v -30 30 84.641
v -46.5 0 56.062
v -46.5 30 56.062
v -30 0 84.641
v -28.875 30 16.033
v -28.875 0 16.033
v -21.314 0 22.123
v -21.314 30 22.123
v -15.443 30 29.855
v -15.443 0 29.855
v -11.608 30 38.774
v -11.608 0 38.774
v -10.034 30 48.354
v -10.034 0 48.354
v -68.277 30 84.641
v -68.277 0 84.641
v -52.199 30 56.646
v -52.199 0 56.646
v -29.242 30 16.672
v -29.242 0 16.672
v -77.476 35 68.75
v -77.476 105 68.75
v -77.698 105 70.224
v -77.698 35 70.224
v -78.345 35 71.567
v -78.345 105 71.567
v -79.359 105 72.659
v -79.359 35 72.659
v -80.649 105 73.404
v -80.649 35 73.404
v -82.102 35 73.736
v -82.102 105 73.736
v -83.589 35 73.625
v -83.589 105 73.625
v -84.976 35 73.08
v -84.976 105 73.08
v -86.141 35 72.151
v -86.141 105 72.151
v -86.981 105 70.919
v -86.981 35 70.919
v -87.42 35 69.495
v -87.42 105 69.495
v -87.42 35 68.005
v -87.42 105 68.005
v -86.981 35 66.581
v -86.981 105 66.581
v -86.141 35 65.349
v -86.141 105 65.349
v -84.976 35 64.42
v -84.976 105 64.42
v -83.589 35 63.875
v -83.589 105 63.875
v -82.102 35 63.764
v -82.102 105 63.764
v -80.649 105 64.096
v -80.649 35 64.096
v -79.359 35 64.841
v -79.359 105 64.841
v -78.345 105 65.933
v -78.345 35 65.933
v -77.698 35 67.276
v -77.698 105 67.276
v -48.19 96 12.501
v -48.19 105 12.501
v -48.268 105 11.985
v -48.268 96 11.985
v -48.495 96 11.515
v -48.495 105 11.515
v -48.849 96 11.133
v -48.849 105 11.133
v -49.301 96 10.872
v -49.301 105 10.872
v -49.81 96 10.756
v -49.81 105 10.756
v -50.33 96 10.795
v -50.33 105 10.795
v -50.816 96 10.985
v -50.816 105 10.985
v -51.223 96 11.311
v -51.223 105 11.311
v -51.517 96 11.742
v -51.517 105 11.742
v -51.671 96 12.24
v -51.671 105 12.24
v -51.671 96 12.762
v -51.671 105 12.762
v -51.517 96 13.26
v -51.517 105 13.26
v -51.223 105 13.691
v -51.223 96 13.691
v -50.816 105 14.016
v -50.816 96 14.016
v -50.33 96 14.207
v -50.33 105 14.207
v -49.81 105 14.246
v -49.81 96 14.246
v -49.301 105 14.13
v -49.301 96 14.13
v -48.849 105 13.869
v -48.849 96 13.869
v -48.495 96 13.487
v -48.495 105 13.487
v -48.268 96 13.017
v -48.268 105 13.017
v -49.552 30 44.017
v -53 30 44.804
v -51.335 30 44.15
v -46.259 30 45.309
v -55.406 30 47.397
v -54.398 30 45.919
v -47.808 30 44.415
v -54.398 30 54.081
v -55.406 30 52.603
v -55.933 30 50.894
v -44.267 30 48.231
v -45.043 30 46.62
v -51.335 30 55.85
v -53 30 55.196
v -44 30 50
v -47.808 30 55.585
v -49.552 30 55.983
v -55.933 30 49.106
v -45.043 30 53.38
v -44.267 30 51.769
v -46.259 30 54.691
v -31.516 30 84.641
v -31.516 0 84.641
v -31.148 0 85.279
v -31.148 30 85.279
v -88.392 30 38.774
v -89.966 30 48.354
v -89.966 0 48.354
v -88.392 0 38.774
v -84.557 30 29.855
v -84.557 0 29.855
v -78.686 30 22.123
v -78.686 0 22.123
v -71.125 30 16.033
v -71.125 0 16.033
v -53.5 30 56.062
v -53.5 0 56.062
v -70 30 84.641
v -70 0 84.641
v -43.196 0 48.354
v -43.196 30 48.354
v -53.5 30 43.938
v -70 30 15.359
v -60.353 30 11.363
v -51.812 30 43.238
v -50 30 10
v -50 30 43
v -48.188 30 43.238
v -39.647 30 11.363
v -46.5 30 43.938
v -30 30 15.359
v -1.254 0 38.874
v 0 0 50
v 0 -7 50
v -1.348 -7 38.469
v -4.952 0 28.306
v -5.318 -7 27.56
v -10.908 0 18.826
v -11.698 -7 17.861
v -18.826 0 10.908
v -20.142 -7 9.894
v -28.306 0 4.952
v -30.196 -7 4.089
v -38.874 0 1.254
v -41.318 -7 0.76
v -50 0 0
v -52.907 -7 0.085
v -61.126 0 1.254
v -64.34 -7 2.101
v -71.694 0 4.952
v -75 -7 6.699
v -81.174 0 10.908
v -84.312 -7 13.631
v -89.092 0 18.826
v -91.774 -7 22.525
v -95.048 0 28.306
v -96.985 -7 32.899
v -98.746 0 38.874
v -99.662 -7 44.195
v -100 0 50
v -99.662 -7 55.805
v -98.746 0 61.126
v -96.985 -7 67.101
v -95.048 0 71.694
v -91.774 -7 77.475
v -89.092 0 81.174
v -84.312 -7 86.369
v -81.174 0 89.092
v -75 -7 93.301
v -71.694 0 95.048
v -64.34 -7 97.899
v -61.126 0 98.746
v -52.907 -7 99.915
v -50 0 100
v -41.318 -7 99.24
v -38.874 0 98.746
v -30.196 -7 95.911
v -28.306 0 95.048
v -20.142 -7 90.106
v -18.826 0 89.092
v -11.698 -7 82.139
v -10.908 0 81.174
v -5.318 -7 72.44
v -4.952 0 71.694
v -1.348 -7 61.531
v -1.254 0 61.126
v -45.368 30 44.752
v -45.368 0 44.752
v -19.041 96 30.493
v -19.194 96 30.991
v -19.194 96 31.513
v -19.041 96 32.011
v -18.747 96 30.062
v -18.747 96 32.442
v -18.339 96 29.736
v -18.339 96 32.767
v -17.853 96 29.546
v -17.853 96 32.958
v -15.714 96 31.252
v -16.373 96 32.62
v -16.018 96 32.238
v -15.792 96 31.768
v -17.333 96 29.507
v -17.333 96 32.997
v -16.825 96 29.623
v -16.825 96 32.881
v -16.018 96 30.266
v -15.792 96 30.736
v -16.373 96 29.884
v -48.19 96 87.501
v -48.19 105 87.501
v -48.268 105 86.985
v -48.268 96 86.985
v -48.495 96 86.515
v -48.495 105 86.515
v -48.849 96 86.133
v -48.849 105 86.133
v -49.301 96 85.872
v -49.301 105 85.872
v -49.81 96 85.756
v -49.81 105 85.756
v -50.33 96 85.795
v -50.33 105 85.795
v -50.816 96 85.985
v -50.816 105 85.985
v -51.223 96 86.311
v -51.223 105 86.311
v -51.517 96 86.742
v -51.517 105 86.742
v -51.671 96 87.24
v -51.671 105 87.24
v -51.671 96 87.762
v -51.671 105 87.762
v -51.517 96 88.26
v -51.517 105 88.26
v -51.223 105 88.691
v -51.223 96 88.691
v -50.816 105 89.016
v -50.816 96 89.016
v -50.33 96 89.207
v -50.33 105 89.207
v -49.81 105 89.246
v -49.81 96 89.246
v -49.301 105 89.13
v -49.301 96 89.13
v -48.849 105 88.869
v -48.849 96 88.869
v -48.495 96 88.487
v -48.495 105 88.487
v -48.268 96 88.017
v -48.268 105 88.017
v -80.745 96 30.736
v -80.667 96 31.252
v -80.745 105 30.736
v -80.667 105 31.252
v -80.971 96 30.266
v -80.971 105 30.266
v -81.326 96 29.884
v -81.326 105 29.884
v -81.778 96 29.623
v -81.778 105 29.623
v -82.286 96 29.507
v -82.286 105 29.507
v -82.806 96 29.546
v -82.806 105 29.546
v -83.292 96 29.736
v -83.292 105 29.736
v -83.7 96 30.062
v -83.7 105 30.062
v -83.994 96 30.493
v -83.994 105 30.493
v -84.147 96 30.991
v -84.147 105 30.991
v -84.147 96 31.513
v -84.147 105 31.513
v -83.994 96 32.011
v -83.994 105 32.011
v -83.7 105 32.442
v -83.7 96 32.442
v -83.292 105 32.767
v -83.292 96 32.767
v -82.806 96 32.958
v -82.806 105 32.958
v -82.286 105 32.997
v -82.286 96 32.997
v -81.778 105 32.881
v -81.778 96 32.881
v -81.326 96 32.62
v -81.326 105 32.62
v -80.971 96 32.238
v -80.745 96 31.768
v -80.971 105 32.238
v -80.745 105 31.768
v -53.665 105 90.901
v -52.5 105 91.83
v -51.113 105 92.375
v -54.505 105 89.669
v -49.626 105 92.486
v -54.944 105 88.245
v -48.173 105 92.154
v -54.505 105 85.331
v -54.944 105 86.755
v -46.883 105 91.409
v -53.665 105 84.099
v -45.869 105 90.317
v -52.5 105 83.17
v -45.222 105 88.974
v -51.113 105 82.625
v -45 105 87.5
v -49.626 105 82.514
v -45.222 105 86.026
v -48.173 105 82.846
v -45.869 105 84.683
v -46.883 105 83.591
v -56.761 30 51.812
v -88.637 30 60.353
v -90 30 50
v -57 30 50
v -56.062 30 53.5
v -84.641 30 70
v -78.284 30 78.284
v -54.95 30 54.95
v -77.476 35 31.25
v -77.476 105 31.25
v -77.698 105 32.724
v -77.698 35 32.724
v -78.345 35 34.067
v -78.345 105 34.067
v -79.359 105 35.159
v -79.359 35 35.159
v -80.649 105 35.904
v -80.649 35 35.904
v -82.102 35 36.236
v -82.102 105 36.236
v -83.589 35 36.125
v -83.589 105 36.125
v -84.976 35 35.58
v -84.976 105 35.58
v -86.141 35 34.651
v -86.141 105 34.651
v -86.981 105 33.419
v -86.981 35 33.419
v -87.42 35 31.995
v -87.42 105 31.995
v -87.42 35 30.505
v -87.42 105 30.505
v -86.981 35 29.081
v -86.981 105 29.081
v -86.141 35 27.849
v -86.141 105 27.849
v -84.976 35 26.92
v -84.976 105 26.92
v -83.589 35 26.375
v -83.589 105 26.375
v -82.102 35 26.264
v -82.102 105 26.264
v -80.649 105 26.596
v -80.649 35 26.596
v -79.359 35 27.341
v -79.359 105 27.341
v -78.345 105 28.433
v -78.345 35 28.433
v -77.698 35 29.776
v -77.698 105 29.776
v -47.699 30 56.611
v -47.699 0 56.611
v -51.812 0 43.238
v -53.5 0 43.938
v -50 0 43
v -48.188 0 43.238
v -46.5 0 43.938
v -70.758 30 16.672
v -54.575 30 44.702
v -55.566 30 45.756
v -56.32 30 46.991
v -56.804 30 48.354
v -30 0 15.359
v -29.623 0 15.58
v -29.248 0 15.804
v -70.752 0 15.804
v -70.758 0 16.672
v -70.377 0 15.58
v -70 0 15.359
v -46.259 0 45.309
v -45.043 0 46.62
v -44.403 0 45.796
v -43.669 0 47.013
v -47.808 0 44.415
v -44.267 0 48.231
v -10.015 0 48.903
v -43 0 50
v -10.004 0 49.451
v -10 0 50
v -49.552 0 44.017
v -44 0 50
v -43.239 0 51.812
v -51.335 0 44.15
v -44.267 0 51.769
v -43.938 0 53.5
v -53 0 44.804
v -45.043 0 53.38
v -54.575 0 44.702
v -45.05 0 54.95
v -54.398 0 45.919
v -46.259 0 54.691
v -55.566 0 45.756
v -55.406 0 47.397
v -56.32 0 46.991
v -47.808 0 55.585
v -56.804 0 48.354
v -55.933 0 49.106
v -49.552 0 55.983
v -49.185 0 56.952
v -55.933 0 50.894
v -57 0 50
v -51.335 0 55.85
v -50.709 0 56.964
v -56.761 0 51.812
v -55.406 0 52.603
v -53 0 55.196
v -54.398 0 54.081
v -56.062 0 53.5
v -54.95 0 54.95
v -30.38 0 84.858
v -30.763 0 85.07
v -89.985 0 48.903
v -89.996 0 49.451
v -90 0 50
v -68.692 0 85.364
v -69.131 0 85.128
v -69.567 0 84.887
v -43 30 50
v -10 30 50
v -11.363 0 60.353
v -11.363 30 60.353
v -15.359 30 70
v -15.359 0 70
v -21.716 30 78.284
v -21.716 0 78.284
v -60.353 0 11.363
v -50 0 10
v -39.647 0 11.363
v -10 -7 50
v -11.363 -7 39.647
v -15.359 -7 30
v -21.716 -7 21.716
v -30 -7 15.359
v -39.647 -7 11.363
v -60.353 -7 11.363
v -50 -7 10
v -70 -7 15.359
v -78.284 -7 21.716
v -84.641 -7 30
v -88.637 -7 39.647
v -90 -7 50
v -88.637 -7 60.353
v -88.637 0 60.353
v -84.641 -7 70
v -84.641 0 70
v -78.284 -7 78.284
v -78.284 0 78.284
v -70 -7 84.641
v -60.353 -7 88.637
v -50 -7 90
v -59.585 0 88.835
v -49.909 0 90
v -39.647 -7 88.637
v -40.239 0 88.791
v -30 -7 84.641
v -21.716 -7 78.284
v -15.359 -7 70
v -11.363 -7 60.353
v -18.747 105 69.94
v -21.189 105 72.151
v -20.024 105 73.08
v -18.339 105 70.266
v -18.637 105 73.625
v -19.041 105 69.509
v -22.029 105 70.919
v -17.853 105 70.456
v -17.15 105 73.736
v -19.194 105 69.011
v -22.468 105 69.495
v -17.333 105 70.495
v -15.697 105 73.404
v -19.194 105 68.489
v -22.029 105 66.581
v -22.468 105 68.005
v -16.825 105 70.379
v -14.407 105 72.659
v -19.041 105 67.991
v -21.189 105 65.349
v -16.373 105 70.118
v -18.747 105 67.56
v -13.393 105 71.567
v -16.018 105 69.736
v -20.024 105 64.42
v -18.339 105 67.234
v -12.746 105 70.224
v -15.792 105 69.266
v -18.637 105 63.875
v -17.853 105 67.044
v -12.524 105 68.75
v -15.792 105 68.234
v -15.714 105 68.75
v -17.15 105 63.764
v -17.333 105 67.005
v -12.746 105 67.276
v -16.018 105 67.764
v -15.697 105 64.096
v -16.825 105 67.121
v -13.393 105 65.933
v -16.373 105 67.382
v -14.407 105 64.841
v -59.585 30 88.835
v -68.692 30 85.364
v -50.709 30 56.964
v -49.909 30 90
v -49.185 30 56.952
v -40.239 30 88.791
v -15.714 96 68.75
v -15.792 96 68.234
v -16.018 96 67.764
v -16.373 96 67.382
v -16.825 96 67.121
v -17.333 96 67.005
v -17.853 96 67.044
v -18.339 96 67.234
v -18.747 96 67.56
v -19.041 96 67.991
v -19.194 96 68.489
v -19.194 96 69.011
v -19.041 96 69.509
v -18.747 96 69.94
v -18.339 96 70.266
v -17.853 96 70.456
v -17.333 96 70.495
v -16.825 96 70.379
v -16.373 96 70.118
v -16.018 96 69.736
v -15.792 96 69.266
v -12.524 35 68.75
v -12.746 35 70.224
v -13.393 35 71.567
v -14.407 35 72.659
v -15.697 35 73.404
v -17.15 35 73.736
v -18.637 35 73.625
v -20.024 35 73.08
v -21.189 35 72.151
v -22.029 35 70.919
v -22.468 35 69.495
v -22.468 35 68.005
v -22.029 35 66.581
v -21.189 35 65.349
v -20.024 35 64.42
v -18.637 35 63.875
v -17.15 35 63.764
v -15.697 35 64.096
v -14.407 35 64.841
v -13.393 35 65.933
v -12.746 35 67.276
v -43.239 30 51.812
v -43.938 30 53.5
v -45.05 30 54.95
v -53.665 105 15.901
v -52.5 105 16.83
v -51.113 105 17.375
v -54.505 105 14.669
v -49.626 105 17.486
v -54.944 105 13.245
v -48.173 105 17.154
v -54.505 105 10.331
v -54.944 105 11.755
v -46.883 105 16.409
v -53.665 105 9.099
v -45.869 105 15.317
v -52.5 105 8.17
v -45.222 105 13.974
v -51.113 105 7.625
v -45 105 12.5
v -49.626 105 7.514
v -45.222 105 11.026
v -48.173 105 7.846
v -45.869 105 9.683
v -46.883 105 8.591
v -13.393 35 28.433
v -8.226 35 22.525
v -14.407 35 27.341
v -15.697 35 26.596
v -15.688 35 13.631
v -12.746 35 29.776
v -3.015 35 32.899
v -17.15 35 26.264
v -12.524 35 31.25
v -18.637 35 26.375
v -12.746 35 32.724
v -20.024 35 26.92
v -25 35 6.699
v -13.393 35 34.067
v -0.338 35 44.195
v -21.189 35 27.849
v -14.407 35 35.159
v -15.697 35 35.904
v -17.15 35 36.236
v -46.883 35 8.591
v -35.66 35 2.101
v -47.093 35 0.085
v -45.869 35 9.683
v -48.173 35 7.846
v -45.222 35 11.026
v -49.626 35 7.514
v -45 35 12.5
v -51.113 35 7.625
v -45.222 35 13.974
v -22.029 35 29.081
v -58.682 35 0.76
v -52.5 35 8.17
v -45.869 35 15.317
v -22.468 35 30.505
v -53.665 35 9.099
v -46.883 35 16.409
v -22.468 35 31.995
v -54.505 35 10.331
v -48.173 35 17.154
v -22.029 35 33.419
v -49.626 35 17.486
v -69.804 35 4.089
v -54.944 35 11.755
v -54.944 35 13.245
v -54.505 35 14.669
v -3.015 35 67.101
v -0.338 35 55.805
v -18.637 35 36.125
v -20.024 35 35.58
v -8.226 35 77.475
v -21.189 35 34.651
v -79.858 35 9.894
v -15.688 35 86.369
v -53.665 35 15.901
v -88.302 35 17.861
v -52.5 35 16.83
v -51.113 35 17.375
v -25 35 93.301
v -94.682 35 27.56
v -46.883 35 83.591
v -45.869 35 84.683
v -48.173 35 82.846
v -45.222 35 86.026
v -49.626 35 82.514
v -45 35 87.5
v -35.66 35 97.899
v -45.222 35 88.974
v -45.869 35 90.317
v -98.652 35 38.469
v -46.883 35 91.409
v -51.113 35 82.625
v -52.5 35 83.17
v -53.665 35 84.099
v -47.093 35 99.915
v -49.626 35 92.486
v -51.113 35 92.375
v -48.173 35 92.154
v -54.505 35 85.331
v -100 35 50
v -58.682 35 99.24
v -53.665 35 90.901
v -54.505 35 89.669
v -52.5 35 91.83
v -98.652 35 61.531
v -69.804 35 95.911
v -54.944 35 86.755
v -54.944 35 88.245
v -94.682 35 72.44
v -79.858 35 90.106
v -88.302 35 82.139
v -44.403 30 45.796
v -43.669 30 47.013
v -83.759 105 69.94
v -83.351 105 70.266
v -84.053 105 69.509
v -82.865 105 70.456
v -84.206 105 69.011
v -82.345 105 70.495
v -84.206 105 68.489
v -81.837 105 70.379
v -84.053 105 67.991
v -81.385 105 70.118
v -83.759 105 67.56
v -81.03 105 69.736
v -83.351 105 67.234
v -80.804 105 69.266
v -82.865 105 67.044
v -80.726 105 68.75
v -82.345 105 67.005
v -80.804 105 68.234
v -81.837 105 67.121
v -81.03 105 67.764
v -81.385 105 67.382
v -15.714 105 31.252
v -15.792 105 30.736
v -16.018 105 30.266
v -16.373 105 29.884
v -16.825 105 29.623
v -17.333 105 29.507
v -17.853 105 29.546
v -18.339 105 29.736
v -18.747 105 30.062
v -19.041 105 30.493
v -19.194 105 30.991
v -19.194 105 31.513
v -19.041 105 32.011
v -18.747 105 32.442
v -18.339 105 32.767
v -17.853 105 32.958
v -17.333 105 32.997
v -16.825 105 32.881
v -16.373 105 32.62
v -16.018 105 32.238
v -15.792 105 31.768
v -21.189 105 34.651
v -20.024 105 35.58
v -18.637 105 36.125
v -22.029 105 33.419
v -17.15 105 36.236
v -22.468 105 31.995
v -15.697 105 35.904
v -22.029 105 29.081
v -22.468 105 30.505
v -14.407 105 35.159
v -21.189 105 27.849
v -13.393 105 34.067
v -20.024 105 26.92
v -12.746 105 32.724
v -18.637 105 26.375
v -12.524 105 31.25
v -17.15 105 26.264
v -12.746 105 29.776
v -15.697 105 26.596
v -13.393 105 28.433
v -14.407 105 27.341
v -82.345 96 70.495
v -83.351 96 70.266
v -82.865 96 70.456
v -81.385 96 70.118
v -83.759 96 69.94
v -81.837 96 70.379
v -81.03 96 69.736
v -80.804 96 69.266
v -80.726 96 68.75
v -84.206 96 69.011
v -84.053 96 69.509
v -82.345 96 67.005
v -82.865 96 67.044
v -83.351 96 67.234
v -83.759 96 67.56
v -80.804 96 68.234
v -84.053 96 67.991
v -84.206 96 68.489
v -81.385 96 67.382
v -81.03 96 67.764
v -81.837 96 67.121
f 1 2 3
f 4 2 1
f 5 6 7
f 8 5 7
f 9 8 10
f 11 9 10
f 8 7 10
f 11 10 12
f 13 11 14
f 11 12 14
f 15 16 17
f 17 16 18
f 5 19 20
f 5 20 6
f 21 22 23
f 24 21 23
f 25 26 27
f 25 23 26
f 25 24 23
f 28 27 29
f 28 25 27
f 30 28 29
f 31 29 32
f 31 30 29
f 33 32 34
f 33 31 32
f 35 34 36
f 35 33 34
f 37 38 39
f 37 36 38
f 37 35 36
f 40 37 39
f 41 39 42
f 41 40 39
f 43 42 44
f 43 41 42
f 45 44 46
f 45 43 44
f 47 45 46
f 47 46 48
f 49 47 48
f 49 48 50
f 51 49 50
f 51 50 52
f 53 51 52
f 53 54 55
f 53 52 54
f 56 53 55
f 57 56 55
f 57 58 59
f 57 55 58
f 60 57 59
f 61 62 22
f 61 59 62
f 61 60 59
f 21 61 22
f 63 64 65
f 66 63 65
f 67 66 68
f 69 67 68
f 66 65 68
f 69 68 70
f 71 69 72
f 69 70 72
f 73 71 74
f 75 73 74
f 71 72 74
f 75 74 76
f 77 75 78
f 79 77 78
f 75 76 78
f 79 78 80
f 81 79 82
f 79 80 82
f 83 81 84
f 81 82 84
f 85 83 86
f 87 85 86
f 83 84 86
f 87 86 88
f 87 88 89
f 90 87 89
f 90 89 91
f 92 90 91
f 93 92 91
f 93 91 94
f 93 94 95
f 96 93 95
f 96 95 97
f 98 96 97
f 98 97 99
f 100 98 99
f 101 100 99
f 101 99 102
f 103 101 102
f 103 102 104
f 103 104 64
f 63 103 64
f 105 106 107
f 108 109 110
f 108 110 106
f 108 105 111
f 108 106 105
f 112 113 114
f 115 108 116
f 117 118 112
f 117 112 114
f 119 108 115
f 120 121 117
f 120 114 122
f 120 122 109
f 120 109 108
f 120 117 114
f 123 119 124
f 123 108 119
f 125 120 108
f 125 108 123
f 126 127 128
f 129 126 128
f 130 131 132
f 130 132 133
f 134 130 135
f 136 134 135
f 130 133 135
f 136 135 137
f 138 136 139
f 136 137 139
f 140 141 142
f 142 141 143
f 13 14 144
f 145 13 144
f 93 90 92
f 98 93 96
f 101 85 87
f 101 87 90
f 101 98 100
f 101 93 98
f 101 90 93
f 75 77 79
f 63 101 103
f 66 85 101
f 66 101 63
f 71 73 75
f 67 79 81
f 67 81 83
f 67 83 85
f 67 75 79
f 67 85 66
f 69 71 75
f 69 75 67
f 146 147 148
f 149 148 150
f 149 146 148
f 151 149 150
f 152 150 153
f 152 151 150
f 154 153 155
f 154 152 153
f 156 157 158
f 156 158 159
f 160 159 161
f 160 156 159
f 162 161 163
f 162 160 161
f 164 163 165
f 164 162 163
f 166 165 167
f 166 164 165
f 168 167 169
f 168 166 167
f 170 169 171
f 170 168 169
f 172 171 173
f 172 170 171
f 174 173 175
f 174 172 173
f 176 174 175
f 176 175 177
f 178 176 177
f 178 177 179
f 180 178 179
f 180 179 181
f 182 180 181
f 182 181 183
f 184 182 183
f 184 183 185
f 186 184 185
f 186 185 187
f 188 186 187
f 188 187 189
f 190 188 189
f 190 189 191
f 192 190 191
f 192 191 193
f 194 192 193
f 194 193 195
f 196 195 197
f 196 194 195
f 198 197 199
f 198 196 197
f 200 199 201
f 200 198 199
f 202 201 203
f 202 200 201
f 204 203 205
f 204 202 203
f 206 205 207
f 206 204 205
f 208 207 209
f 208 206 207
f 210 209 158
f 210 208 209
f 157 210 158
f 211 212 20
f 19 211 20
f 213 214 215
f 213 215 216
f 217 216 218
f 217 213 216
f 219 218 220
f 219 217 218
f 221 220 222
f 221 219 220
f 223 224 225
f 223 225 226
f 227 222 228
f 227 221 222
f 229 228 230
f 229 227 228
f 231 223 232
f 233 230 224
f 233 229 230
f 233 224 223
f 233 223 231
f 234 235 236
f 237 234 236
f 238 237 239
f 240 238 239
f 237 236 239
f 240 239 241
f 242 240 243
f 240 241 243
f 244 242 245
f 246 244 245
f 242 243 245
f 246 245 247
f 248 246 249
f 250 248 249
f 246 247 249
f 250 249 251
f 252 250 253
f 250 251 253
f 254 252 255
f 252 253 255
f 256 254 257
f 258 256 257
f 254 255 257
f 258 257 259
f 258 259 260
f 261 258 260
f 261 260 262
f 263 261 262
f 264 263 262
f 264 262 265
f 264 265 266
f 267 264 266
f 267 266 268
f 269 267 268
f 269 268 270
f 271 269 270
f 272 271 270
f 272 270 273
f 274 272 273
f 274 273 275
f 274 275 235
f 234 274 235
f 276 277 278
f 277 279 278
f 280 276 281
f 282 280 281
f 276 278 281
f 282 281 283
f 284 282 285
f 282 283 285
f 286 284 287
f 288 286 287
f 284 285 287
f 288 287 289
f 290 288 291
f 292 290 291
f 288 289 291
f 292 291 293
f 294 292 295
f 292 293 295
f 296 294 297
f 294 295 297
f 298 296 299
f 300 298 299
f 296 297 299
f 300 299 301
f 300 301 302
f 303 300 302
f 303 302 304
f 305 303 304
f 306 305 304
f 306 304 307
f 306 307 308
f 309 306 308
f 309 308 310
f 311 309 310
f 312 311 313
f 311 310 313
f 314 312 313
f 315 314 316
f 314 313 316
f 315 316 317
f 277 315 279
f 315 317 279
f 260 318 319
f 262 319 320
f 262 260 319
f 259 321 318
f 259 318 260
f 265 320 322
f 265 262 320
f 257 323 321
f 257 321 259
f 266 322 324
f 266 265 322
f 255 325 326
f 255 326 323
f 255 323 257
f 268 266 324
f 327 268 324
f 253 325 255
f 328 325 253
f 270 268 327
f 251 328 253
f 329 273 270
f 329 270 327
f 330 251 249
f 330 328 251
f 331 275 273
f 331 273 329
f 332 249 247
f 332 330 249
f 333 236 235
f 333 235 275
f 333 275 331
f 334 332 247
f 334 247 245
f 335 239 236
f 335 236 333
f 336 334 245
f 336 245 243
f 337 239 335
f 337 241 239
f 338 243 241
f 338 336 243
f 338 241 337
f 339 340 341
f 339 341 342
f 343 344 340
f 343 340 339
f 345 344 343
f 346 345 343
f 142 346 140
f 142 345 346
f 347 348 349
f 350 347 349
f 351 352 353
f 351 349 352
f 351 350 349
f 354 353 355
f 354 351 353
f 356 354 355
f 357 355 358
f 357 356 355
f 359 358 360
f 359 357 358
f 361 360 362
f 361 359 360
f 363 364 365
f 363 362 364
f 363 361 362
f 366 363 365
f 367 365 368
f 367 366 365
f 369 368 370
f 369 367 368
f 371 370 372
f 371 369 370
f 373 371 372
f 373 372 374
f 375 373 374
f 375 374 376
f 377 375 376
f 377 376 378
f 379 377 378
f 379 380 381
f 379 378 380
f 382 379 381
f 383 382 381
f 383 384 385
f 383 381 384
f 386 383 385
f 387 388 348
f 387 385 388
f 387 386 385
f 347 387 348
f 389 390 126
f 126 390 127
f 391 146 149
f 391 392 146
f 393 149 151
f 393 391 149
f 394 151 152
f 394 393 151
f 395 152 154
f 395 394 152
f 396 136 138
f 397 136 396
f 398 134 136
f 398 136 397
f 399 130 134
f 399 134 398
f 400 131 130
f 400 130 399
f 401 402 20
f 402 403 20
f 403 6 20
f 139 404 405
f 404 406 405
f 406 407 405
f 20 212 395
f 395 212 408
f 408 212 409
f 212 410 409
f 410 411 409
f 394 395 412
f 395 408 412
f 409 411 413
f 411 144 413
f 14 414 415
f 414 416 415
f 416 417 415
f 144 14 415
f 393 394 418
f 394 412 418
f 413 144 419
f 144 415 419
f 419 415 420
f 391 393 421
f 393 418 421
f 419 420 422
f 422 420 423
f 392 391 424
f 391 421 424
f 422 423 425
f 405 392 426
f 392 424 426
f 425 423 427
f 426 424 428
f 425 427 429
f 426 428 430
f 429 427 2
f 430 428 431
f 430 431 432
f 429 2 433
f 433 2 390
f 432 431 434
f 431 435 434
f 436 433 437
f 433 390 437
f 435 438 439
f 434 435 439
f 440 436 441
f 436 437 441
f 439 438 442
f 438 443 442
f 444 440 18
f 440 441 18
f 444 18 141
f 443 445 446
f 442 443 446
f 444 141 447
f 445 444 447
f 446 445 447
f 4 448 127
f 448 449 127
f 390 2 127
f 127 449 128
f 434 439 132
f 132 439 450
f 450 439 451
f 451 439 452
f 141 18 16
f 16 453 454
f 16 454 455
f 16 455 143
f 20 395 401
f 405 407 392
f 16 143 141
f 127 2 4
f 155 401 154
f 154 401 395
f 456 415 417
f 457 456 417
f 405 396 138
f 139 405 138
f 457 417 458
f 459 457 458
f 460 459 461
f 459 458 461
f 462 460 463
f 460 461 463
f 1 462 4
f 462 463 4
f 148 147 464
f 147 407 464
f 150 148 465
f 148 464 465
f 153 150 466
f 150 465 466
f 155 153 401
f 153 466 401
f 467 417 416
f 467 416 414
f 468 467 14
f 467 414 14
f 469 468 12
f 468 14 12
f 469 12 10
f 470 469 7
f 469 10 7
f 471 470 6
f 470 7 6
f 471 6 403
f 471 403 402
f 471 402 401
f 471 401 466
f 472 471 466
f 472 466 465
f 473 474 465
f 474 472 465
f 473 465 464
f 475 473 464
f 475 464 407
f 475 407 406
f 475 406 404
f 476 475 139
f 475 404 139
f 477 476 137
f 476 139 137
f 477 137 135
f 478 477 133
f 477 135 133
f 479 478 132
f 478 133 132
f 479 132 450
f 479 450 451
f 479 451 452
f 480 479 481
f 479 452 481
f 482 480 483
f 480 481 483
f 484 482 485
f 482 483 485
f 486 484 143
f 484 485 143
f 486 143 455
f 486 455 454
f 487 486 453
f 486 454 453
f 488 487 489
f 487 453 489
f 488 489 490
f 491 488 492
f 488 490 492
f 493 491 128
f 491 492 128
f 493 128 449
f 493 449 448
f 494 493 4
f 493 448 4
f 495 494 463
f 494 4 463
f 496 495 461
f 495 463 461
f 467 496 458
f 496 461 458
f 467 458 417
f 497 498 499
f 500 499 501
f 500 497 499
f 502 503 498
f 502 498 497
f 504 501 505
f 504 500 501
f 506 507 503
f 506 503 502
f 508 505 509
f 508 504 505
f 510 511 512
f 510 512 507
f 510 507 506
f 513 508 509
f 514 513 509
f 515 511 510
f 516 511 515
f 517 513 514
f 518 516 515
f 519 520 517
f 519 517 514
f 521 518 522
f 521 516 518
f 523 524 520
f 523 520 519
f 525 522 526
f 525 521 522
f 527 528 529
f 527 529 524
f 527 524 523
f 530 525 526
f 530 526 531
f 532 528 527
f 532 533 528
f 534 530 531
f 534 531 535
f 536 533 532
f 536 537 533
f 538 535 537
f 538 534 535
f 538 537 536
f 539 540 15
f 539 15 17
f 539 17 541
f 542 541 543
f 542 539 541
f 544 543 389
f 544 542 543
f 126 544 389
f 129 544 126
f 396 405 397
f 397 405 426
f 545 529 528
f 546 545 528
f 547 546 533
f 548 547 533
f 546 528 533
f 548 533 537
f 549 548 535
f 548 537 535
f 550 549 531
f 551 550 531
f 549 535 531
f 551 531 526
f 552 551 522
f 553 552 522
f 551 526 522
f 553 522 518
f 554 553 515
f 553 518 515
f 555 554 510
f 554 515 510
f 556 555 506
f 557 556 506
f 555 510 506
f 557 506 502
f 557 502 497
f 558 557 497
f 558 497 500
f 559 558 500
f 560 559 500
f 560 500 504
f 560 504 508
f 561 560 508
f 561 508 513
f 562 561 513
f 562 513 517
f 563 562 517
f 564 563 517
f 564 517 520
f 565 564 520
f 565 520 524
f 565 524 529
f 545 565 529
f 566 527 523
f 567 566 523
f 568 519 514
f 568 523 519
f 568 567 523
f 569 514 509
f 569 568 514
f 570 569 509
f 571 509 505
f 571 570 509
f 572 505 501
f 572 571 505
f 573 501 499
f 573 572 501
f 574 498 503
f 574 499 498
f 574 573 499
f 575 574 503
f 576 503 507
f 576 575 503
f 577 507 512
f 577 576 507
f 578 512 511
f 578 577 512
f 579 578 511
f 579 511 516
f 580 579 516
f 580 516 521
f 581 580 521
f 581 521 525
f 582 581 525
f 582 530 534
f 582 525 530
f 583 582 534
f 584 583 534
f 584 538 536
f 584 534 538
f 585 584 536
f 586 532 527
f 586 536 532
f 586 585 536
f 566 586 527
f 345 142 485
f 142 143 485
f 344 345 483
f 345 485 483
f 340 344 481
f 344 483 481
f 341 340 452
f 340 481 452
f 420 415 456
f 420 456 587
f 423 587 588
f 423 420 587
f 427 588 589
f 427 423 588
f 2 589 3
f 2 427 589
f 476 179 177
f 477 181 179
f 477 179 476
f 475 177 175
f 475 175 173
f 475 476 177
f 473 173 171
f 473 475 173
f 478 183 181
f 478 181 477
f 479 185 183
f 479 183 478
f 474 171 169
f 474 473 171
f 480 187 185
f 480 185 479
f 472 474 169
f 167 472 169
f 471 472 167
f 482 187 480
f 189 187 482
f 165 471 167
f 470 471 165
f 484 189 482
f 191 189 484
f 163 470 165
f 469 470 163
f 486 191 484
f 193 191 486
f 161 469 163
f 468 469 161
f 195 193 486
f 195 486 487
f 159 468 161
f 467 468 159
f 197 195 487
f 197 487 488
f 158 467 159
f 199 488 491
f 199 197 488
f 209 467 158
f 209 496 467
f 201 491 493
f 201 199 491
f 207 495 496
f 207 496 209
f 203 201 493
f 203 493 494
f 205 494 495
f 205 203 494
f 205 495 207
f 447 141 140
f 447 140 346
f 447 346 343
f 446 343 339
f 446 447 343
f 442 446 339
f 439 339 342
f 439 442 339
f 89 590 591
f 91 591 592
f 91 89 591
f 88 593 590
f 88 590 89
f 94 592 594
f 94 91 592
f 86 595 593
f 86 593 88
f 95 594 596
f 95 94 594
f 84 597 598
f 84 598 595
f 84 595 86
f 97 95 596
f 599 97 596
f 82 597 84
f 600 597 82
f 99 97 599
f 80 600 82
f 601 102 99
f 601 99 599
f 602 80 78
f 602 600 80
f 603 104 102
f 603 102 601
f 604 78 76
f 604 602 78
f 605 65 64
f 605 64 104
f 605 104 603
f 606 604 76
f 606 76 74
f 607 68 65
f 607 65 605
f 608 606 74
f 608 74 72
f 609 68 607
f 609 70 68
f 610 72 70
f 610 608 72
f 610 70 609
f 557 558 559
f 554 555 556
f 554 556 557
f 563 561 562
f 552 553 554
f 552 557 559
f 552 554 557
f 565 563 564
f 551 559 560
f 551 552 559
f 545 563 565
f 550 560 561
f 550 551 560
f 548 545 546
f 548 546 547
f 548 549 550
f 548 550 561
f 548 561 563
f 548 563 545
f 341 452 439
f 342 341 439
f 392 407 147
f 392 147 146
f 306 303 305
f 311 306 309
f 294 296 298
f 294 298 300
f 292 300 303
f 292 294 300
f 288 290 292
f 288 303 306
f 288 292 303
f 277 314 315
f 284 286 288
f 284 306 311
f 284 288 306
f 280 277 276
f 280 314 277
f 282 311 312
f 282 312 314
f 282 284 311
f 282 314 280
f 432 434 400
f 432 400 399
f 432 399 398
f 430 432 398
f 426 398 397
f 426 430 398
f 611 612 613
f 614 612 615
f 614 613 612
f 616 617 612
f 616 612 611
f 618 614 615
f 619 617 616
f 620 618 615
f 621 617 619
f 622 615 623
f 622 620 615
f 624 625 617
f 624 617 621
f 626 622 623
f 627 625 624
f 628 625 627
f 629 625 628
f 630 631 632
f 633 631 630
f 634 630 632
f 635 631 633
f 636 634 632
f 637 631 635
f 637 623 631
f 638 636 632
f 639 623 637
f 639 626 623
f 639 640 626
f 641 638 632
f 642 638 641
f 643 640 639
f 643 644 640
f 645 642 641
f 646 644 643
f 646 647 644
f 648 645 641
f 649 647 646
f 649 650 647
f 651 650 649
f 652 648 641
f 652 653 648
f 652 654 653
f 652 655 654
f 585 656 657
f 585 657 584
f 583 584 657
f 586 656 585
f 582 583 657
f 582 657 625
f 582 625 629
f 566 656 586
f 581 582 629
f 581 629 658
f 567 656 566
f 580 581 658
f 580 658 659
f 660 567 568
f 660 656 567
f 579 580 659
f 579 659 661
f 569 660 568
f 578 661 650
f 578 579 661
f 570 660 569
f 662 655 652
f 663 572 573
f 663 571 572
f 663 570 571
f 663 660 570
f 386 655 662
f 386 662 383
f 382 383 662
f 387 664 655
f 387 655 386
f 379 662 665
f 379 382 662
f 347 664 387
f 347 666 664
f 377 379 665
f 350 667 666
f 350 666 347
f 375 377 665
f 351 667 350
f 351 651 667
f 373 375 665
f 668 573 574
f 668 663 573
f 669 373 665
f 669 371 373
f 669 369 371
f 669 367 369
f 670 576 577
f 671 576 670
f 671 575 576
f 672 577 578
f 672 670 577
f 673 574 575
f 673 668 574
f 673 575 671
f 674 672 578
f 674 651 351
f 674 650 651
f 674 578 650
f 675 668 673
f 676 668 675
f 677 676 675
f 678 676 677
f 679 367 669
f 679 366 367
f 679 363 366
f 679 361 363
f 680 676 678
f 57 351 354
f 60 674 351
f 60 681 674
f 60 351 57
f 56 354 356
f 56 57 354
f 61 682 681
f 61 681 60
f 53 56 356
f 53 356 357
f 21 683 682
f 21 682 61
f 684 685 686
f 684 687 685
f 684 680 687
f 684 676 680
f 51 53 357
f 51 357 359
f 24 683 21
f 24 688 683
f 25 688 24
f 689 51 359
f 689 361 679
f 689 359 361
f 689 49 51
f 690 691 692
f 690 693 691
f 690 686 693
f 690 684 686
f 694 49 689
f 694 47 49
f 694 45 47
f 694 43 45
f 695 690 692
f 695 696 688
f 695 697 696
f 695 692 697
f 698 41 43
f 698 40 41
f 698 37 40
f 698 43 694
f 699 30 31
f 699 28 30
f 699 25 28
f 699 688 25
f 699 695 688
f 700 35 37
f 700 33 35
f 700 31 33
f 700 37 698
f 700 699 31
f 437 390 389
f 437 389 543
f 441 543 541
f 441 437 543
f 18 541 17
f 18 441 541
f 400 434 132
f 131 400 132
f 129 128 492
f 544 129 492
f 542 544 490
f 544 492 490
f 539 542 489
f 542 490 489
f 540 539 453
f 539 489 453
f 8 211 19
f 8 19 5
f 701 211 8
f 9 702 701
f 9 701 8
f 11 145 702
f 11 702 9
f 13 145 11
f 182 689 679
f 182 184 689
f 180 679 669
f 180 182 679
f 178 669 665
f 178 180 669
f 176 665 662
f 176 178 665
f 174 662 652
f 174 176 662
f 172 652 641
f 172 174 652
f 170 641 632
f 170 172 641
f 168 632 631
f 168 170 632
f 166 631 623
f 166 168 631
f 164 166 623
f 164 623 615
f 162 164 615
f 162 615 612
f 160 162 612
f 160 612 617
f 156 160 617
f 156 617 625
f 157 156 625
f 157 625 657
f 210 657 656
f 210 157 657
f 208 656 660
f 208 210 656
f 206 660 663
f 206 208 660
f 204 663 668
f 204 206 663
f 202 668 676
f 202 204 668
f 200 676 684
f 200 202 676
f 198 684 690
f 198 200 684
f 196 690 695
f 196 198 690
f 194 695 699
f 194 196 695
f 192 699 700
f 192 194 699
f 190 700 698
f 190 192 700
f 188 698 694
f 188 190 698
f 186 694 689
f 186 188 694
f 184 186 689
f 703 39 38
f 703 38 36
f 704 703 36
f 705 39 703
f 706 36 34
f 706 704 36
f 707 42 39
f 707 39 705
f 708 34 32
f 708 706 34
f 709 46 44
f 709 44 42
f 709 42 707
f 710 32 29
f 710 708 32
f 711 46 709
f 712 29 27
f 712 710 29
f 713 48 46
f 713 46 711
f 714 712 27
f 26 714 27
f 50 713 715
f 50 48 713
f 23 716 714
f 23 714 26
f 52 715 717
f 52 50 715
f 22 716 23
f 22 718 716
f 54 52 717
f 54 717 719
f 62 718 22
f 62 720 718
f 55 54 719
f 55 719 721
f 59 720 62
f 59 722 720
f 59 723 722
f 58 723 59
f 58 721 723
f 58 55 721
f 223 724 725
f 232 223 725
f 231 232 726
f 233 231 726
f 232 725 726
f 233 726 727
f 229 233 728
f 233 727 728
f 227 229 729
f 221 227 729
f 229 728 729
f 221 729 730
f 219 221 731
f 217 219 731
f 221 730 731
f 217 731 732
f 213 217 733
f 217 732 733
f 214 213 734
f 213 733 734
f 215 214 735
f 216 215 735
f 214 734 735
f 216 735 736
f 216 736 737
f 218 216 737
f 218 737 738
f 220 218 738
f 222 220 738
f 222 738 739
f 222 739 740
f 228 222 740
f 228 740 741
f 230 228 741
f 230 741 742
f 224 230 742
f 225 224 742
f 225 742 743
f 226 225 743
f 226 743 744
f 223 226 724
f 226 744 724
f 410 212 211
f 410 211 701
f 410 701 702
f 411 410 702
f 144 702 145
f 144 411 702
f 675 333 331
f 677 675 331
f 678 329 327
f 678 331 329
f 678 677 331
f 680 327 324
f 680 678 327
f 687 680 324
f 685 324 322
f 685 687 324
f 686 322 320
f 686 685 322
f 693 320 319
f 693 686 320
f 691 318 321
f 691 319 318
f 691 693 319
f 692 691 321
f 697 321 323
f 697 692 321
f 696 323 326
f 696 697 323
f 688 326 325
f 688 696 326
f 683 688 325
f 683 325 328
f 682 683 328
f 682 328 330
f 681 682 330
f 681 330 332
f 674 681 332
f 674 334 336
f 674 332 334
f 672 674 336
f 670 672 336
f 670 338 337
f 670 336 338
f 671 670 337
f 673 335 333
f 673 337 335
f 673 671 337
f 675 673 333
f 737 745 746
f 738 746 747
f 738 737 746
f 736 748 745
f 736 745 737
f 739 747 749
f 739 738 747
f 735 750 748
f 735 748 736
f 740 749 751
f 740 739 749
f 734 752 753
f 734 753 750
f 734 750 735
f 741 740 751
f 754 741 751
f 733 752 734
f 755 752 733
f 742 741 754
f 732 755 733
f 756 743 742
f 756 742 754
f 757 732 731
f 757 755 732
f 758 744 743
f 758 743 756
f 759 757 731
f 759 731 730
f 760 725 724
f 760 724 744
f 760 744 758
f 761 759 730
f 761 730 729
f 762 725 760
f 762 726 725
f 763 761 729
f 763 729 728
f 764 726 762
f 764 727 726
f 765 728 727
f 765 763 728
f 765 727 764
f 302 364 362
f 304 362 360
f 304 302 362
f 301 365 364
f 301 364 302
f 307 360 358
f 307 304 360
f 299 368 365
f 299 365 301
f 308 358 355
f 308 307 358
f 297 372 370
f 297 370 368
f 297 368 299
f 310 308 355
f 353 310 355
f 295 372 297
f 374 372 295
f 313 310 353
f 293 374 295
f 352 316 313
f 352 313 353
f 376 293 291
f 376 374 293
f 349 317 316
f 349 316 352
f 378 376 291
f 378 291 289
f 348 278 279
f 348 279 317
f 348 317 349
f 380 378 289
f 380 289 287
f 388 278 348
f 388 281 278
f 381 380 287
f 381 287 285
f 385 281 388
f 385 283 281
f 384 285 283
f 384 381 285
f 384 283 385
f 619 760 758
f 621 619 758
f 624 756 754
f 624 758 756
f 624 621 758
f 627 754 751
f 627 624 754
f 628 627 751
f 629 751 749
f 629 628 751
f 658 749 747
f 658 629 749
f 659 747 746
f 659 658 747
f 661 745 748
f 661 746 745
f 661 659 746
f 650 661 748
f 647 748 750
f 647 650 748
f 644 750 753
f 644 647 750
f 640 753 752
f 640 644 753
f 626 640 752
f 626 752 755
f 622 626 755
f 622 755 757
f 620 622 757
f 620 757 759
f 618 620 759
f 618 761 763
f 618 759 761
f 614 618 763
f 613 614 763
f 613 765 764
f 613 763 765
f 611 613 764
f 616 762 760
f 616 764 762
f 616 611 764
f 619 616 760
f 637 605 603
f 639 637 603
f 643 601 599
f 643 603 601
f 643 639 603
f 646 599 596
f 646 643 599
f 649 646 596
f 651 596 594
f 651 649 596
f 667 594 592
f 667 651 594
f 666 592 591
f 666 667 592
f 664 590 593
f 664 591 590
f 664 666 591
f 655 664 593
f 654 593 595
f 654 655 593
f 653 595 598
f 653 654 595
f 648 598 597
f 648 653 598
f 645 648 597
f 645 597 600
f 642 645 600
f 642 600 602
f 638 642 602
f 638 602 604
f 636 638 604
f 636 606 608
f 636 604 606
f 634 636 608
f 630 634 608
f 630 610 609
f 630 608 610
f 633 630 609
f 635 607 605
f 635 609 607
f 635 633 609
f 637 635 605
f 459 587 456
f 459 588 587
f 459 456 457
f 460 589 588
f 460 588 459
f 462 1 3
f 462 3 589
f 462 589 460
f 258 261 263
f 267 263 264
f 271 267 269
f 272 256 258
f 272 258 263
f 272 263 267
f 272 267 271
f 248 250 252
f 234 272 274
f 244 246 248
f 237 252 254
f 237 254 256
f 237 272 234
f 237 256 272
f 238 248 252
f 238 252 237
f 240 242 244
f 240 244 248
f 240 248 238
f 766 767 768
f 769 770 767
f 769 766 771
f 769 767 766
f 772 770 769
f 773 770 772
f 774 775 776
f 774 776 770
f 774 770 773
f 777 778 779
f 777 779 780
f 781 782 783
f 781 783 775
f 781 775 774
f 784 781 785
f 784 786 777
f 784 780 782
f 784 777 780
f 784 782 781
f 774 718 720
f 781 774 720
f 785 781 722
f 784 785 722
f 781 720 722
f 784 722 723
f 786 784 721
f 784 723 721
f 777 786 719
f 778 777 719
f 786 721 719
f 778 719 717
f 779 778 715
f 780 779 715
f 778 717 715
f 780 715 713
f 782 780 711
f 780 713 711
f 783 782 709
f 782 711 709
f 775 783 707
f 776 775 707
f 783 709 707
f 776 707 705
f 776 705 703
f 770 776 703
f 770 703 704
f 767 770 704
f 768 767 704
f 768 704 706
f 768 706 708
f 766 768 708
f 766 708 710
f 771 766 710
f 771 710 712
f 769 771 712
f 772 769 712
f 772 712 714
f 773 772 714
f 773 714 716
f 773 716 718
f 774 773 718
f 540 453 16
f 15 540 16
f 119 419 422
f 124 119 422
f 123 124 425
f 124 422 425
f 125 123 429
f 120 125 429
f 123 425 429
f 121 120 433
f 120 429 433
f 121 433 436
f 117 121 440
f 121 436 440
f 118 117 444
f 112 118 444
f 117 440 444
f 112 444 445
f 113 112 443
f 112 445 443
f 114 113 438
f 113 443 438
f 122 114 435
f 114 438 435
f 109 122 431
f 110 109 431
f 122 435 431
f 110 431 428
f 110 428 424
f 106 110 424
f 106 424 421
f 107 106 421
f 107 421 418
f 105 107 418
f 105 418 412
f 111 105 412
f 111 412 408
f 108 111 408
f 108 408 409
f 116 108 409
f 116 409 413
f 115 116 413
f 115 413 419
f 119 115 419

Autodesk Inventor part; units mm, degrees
ref_plane "YZ Plane" through (0, 0, 0) normal (1, 0, 0) x (0, 1, 0)
ref_plane "XZ Plane" through (0, 0, 0) normal (0, 1, 0) x (-1, 0, 0)
ref_plane "XY Plane" through (0, 0, 0) normal (0, 0, 1) x (1, 0, 0)
sketch "Boceto1" plane through (0, 0, 0) normal (0, 1, 0) x (-1, 0, 0)
  line L0 (0, 0) -> (100, 0) construction
  line L1 (100, 0) -> (100, 100) construction
  line L2 (100, 100) -> (0, 100) construction
  line L3 (0, 100) -> (0, 0) construction
  line L4 (0, 100) -> (100, 0) construction
  line L5 (100, 100) -> (0, 0) construction
  circle A0 centre (50, 50) radius 50
  dimension "d2" = 100
extrude "Extrusión1" add sketch "Boceto1" along normal blind 35
sketch "Boceto2" plane through (-50, 35, 50) normal (0, 1, 0) x (1, 0, 0)
  circle A0 centre (0, 0) radius 37.5 construction
  line L0 (0, 37.5) -> (32.476, 18.75) construction
  line L1 (32.476, 18.75) -> (32.476, -18.75) construction
  line L2 (32.476, -18.75) -> (0, -37.5) construction
  line L3 (0, -37.5) -> (-32.476, -18.75) construction
  line L4 (-32.476, -18.75) -> (-32.476, 18.75) construction
  line L5 (-32.476, 18.75) -> (0, 37.5) construction
  circle A1 centre (0, 37.5) radius 5
  circle A2 centre (32.476, 18.75) radius 5
  circle A3 centre (32.476, -18.75) radius 5
  circle A4 centre (0, -37.5) radius 5
  circle A5 centre (-32.476, -18.75) radius 5
  circle A6 centre (-32.476, 18.75) radius 5
  point P0 (50, 50)
  dimension "d5" = 75
  dimension "d6" = 10
  dimension "d7" = 10
  dimension "d8" = 10
  dimension "d9" = 10
  dimension "d10" = 10
  dimension "d11" = 10
extrude "Extrusión2" add sketch "Boceto2" along normal blind 70
sketch "Boceto3" plane through (-82.476, 105, 68.75) normal (0, 1, 0) x (1, 0, 0)
  circle A0 centre (32.5355, 18.7491) radius 37.5 construction
  circle A1 centre (32.5355, -18.7509) radius 1.75
  circle A2 centre (65.012, 0) radius 1.75
  circle A3 centre (65.012, 37.4981) radius 1.75
  circle A4 centre (32.5355, 56.2491) radius 1.75
  circle A5 centre (0.059, 37.4981) radius 1.75
  circle A6 centre (0, 0) radius 5 projected
  circle A7 centre (0, 0) radius 1.75
  point P0 (82.476, 68.75)
  dimension "d15" = 3.5
  dimension "d16" = 3.5
  dimension "d17" = 3.5
  dimension "d18" = 3.5
  dimension "d19" = 3.5
  dimension "d20" = 3.5
extrude "Extrusión3" cut sketch "Boceto3" against normal blind 9 contours A1 | A2 | A3 | A4 | A5 | A7
sketch "Boceto4" plane through (-50, 0, 50) normal (0, -1, 0) x (1, 0, 0)
  circle A0 centre (0, 0) radius 40
  circle A1 centre (0, 0) radius 6
  line L0 (-20, -34.641) -> (-3.5, -6.0622)
  line L1 (-20.7581, -33.3279) -> (-4.5751, -5.298)
  line L2 (20, -34.641) -> (3.5, -6.0622)
  line L3 (-18.2769, 34.641) -> (-2.199, 6.6456)
  line L4 (4.6319, -5.2484) -> (20.7581, -33.3279)
  line L5 (39.0497, -1.6459) -> (6.8037, -1.6459)
  line L6 (7, 0) -> (40, 0)
  line L7 (3.5, 6.0622) -> (20, 34.641)
  line L8 (2.3007, 6.6111) -> (18.4837, 34.641)
  arc A2 (2.3007, 6.6111) -> (-2.199, 6.6456) centre (0, 0) ccw
  arc A3 (-3.5, 6.0622) -> (-7, 0) centre (0, 0) ccw
  line L9 (-6.8037, -1.6459) -> (-39.0497, -1.6459)
  arc A4 (-6.8037, -1.6459) -> (-4.5751, -5.298) centre (0, 0) ccw
  line L10 (-40, 0) -> (-7, 0)
  arc A5 (-3.5, -6.0622) -> (3.5, -6.0622) centre (0, 0) ccw
  arc A6 (4.6319, -5.2484) -> (6.8037, -1.6459) centre (0, 0) ccw
  arc A7 (7, 0) -> (3.5, 6.0622) centre (0, 0) ccw
  line L11 (-3.5, 6.0622) -> (-20, 34.641)
  line L12 (20.7581, -33.3279) -> (21.125, -33.9667)
  line L13 (39.0497, -1.6459) -> (39.9661, -1.6459)
  line L14 (18.4837, 34.641) -> (18.852, 35.2789)
  line L15 (-18.6921, 35.3639) -> (-18.2769, 34.641)
  line L16 (-39.0497, -1.6459) -> (-39.9661, -1.6459)
  line L17 (-20.7581, -33.3279) -> (-21.125, -33.9667)
  point P0 (50, -50)
  point P1 (-20, -34.641)
  point P2 (20, 34.641)
  point P3 (-20, 34.641)
  dimension "d23" = 80
  dimension "d24" = 12
extrude "Extrusión4" cut sketch "Boceto4" against normal blind 30 contours L6 A7 L7 A0 | A0 L12 L4 A6 L5 L13 | L14 L8 A2 L3 L15 A0 | A0 L0 A5 L2 | L11 A3 L10 A0 | A0 L16 L9 A4 L1 L17 | A1
sketch "Boceto5" plane through (-50, 0, 50) normal (0, -1, 0) x (1, 0, 0)
  arc A0 (-3.5, 6.0622) -> (-7, 0) centre (0, 0) ccw projected
  circle A1 centre (0, 0) radius 50
  circle A2 centre (0, 0) radius 40
  point P0 (50, -50)
  dimension "d28" = 100
  dimension "d29" = 80
extrude "Extrusión5" add sketch "Boceto5" along normal blind 7
thread "Rosca1" size "M80x1.5" class "6H" standard "ANSI Metric M Profile" length 6
